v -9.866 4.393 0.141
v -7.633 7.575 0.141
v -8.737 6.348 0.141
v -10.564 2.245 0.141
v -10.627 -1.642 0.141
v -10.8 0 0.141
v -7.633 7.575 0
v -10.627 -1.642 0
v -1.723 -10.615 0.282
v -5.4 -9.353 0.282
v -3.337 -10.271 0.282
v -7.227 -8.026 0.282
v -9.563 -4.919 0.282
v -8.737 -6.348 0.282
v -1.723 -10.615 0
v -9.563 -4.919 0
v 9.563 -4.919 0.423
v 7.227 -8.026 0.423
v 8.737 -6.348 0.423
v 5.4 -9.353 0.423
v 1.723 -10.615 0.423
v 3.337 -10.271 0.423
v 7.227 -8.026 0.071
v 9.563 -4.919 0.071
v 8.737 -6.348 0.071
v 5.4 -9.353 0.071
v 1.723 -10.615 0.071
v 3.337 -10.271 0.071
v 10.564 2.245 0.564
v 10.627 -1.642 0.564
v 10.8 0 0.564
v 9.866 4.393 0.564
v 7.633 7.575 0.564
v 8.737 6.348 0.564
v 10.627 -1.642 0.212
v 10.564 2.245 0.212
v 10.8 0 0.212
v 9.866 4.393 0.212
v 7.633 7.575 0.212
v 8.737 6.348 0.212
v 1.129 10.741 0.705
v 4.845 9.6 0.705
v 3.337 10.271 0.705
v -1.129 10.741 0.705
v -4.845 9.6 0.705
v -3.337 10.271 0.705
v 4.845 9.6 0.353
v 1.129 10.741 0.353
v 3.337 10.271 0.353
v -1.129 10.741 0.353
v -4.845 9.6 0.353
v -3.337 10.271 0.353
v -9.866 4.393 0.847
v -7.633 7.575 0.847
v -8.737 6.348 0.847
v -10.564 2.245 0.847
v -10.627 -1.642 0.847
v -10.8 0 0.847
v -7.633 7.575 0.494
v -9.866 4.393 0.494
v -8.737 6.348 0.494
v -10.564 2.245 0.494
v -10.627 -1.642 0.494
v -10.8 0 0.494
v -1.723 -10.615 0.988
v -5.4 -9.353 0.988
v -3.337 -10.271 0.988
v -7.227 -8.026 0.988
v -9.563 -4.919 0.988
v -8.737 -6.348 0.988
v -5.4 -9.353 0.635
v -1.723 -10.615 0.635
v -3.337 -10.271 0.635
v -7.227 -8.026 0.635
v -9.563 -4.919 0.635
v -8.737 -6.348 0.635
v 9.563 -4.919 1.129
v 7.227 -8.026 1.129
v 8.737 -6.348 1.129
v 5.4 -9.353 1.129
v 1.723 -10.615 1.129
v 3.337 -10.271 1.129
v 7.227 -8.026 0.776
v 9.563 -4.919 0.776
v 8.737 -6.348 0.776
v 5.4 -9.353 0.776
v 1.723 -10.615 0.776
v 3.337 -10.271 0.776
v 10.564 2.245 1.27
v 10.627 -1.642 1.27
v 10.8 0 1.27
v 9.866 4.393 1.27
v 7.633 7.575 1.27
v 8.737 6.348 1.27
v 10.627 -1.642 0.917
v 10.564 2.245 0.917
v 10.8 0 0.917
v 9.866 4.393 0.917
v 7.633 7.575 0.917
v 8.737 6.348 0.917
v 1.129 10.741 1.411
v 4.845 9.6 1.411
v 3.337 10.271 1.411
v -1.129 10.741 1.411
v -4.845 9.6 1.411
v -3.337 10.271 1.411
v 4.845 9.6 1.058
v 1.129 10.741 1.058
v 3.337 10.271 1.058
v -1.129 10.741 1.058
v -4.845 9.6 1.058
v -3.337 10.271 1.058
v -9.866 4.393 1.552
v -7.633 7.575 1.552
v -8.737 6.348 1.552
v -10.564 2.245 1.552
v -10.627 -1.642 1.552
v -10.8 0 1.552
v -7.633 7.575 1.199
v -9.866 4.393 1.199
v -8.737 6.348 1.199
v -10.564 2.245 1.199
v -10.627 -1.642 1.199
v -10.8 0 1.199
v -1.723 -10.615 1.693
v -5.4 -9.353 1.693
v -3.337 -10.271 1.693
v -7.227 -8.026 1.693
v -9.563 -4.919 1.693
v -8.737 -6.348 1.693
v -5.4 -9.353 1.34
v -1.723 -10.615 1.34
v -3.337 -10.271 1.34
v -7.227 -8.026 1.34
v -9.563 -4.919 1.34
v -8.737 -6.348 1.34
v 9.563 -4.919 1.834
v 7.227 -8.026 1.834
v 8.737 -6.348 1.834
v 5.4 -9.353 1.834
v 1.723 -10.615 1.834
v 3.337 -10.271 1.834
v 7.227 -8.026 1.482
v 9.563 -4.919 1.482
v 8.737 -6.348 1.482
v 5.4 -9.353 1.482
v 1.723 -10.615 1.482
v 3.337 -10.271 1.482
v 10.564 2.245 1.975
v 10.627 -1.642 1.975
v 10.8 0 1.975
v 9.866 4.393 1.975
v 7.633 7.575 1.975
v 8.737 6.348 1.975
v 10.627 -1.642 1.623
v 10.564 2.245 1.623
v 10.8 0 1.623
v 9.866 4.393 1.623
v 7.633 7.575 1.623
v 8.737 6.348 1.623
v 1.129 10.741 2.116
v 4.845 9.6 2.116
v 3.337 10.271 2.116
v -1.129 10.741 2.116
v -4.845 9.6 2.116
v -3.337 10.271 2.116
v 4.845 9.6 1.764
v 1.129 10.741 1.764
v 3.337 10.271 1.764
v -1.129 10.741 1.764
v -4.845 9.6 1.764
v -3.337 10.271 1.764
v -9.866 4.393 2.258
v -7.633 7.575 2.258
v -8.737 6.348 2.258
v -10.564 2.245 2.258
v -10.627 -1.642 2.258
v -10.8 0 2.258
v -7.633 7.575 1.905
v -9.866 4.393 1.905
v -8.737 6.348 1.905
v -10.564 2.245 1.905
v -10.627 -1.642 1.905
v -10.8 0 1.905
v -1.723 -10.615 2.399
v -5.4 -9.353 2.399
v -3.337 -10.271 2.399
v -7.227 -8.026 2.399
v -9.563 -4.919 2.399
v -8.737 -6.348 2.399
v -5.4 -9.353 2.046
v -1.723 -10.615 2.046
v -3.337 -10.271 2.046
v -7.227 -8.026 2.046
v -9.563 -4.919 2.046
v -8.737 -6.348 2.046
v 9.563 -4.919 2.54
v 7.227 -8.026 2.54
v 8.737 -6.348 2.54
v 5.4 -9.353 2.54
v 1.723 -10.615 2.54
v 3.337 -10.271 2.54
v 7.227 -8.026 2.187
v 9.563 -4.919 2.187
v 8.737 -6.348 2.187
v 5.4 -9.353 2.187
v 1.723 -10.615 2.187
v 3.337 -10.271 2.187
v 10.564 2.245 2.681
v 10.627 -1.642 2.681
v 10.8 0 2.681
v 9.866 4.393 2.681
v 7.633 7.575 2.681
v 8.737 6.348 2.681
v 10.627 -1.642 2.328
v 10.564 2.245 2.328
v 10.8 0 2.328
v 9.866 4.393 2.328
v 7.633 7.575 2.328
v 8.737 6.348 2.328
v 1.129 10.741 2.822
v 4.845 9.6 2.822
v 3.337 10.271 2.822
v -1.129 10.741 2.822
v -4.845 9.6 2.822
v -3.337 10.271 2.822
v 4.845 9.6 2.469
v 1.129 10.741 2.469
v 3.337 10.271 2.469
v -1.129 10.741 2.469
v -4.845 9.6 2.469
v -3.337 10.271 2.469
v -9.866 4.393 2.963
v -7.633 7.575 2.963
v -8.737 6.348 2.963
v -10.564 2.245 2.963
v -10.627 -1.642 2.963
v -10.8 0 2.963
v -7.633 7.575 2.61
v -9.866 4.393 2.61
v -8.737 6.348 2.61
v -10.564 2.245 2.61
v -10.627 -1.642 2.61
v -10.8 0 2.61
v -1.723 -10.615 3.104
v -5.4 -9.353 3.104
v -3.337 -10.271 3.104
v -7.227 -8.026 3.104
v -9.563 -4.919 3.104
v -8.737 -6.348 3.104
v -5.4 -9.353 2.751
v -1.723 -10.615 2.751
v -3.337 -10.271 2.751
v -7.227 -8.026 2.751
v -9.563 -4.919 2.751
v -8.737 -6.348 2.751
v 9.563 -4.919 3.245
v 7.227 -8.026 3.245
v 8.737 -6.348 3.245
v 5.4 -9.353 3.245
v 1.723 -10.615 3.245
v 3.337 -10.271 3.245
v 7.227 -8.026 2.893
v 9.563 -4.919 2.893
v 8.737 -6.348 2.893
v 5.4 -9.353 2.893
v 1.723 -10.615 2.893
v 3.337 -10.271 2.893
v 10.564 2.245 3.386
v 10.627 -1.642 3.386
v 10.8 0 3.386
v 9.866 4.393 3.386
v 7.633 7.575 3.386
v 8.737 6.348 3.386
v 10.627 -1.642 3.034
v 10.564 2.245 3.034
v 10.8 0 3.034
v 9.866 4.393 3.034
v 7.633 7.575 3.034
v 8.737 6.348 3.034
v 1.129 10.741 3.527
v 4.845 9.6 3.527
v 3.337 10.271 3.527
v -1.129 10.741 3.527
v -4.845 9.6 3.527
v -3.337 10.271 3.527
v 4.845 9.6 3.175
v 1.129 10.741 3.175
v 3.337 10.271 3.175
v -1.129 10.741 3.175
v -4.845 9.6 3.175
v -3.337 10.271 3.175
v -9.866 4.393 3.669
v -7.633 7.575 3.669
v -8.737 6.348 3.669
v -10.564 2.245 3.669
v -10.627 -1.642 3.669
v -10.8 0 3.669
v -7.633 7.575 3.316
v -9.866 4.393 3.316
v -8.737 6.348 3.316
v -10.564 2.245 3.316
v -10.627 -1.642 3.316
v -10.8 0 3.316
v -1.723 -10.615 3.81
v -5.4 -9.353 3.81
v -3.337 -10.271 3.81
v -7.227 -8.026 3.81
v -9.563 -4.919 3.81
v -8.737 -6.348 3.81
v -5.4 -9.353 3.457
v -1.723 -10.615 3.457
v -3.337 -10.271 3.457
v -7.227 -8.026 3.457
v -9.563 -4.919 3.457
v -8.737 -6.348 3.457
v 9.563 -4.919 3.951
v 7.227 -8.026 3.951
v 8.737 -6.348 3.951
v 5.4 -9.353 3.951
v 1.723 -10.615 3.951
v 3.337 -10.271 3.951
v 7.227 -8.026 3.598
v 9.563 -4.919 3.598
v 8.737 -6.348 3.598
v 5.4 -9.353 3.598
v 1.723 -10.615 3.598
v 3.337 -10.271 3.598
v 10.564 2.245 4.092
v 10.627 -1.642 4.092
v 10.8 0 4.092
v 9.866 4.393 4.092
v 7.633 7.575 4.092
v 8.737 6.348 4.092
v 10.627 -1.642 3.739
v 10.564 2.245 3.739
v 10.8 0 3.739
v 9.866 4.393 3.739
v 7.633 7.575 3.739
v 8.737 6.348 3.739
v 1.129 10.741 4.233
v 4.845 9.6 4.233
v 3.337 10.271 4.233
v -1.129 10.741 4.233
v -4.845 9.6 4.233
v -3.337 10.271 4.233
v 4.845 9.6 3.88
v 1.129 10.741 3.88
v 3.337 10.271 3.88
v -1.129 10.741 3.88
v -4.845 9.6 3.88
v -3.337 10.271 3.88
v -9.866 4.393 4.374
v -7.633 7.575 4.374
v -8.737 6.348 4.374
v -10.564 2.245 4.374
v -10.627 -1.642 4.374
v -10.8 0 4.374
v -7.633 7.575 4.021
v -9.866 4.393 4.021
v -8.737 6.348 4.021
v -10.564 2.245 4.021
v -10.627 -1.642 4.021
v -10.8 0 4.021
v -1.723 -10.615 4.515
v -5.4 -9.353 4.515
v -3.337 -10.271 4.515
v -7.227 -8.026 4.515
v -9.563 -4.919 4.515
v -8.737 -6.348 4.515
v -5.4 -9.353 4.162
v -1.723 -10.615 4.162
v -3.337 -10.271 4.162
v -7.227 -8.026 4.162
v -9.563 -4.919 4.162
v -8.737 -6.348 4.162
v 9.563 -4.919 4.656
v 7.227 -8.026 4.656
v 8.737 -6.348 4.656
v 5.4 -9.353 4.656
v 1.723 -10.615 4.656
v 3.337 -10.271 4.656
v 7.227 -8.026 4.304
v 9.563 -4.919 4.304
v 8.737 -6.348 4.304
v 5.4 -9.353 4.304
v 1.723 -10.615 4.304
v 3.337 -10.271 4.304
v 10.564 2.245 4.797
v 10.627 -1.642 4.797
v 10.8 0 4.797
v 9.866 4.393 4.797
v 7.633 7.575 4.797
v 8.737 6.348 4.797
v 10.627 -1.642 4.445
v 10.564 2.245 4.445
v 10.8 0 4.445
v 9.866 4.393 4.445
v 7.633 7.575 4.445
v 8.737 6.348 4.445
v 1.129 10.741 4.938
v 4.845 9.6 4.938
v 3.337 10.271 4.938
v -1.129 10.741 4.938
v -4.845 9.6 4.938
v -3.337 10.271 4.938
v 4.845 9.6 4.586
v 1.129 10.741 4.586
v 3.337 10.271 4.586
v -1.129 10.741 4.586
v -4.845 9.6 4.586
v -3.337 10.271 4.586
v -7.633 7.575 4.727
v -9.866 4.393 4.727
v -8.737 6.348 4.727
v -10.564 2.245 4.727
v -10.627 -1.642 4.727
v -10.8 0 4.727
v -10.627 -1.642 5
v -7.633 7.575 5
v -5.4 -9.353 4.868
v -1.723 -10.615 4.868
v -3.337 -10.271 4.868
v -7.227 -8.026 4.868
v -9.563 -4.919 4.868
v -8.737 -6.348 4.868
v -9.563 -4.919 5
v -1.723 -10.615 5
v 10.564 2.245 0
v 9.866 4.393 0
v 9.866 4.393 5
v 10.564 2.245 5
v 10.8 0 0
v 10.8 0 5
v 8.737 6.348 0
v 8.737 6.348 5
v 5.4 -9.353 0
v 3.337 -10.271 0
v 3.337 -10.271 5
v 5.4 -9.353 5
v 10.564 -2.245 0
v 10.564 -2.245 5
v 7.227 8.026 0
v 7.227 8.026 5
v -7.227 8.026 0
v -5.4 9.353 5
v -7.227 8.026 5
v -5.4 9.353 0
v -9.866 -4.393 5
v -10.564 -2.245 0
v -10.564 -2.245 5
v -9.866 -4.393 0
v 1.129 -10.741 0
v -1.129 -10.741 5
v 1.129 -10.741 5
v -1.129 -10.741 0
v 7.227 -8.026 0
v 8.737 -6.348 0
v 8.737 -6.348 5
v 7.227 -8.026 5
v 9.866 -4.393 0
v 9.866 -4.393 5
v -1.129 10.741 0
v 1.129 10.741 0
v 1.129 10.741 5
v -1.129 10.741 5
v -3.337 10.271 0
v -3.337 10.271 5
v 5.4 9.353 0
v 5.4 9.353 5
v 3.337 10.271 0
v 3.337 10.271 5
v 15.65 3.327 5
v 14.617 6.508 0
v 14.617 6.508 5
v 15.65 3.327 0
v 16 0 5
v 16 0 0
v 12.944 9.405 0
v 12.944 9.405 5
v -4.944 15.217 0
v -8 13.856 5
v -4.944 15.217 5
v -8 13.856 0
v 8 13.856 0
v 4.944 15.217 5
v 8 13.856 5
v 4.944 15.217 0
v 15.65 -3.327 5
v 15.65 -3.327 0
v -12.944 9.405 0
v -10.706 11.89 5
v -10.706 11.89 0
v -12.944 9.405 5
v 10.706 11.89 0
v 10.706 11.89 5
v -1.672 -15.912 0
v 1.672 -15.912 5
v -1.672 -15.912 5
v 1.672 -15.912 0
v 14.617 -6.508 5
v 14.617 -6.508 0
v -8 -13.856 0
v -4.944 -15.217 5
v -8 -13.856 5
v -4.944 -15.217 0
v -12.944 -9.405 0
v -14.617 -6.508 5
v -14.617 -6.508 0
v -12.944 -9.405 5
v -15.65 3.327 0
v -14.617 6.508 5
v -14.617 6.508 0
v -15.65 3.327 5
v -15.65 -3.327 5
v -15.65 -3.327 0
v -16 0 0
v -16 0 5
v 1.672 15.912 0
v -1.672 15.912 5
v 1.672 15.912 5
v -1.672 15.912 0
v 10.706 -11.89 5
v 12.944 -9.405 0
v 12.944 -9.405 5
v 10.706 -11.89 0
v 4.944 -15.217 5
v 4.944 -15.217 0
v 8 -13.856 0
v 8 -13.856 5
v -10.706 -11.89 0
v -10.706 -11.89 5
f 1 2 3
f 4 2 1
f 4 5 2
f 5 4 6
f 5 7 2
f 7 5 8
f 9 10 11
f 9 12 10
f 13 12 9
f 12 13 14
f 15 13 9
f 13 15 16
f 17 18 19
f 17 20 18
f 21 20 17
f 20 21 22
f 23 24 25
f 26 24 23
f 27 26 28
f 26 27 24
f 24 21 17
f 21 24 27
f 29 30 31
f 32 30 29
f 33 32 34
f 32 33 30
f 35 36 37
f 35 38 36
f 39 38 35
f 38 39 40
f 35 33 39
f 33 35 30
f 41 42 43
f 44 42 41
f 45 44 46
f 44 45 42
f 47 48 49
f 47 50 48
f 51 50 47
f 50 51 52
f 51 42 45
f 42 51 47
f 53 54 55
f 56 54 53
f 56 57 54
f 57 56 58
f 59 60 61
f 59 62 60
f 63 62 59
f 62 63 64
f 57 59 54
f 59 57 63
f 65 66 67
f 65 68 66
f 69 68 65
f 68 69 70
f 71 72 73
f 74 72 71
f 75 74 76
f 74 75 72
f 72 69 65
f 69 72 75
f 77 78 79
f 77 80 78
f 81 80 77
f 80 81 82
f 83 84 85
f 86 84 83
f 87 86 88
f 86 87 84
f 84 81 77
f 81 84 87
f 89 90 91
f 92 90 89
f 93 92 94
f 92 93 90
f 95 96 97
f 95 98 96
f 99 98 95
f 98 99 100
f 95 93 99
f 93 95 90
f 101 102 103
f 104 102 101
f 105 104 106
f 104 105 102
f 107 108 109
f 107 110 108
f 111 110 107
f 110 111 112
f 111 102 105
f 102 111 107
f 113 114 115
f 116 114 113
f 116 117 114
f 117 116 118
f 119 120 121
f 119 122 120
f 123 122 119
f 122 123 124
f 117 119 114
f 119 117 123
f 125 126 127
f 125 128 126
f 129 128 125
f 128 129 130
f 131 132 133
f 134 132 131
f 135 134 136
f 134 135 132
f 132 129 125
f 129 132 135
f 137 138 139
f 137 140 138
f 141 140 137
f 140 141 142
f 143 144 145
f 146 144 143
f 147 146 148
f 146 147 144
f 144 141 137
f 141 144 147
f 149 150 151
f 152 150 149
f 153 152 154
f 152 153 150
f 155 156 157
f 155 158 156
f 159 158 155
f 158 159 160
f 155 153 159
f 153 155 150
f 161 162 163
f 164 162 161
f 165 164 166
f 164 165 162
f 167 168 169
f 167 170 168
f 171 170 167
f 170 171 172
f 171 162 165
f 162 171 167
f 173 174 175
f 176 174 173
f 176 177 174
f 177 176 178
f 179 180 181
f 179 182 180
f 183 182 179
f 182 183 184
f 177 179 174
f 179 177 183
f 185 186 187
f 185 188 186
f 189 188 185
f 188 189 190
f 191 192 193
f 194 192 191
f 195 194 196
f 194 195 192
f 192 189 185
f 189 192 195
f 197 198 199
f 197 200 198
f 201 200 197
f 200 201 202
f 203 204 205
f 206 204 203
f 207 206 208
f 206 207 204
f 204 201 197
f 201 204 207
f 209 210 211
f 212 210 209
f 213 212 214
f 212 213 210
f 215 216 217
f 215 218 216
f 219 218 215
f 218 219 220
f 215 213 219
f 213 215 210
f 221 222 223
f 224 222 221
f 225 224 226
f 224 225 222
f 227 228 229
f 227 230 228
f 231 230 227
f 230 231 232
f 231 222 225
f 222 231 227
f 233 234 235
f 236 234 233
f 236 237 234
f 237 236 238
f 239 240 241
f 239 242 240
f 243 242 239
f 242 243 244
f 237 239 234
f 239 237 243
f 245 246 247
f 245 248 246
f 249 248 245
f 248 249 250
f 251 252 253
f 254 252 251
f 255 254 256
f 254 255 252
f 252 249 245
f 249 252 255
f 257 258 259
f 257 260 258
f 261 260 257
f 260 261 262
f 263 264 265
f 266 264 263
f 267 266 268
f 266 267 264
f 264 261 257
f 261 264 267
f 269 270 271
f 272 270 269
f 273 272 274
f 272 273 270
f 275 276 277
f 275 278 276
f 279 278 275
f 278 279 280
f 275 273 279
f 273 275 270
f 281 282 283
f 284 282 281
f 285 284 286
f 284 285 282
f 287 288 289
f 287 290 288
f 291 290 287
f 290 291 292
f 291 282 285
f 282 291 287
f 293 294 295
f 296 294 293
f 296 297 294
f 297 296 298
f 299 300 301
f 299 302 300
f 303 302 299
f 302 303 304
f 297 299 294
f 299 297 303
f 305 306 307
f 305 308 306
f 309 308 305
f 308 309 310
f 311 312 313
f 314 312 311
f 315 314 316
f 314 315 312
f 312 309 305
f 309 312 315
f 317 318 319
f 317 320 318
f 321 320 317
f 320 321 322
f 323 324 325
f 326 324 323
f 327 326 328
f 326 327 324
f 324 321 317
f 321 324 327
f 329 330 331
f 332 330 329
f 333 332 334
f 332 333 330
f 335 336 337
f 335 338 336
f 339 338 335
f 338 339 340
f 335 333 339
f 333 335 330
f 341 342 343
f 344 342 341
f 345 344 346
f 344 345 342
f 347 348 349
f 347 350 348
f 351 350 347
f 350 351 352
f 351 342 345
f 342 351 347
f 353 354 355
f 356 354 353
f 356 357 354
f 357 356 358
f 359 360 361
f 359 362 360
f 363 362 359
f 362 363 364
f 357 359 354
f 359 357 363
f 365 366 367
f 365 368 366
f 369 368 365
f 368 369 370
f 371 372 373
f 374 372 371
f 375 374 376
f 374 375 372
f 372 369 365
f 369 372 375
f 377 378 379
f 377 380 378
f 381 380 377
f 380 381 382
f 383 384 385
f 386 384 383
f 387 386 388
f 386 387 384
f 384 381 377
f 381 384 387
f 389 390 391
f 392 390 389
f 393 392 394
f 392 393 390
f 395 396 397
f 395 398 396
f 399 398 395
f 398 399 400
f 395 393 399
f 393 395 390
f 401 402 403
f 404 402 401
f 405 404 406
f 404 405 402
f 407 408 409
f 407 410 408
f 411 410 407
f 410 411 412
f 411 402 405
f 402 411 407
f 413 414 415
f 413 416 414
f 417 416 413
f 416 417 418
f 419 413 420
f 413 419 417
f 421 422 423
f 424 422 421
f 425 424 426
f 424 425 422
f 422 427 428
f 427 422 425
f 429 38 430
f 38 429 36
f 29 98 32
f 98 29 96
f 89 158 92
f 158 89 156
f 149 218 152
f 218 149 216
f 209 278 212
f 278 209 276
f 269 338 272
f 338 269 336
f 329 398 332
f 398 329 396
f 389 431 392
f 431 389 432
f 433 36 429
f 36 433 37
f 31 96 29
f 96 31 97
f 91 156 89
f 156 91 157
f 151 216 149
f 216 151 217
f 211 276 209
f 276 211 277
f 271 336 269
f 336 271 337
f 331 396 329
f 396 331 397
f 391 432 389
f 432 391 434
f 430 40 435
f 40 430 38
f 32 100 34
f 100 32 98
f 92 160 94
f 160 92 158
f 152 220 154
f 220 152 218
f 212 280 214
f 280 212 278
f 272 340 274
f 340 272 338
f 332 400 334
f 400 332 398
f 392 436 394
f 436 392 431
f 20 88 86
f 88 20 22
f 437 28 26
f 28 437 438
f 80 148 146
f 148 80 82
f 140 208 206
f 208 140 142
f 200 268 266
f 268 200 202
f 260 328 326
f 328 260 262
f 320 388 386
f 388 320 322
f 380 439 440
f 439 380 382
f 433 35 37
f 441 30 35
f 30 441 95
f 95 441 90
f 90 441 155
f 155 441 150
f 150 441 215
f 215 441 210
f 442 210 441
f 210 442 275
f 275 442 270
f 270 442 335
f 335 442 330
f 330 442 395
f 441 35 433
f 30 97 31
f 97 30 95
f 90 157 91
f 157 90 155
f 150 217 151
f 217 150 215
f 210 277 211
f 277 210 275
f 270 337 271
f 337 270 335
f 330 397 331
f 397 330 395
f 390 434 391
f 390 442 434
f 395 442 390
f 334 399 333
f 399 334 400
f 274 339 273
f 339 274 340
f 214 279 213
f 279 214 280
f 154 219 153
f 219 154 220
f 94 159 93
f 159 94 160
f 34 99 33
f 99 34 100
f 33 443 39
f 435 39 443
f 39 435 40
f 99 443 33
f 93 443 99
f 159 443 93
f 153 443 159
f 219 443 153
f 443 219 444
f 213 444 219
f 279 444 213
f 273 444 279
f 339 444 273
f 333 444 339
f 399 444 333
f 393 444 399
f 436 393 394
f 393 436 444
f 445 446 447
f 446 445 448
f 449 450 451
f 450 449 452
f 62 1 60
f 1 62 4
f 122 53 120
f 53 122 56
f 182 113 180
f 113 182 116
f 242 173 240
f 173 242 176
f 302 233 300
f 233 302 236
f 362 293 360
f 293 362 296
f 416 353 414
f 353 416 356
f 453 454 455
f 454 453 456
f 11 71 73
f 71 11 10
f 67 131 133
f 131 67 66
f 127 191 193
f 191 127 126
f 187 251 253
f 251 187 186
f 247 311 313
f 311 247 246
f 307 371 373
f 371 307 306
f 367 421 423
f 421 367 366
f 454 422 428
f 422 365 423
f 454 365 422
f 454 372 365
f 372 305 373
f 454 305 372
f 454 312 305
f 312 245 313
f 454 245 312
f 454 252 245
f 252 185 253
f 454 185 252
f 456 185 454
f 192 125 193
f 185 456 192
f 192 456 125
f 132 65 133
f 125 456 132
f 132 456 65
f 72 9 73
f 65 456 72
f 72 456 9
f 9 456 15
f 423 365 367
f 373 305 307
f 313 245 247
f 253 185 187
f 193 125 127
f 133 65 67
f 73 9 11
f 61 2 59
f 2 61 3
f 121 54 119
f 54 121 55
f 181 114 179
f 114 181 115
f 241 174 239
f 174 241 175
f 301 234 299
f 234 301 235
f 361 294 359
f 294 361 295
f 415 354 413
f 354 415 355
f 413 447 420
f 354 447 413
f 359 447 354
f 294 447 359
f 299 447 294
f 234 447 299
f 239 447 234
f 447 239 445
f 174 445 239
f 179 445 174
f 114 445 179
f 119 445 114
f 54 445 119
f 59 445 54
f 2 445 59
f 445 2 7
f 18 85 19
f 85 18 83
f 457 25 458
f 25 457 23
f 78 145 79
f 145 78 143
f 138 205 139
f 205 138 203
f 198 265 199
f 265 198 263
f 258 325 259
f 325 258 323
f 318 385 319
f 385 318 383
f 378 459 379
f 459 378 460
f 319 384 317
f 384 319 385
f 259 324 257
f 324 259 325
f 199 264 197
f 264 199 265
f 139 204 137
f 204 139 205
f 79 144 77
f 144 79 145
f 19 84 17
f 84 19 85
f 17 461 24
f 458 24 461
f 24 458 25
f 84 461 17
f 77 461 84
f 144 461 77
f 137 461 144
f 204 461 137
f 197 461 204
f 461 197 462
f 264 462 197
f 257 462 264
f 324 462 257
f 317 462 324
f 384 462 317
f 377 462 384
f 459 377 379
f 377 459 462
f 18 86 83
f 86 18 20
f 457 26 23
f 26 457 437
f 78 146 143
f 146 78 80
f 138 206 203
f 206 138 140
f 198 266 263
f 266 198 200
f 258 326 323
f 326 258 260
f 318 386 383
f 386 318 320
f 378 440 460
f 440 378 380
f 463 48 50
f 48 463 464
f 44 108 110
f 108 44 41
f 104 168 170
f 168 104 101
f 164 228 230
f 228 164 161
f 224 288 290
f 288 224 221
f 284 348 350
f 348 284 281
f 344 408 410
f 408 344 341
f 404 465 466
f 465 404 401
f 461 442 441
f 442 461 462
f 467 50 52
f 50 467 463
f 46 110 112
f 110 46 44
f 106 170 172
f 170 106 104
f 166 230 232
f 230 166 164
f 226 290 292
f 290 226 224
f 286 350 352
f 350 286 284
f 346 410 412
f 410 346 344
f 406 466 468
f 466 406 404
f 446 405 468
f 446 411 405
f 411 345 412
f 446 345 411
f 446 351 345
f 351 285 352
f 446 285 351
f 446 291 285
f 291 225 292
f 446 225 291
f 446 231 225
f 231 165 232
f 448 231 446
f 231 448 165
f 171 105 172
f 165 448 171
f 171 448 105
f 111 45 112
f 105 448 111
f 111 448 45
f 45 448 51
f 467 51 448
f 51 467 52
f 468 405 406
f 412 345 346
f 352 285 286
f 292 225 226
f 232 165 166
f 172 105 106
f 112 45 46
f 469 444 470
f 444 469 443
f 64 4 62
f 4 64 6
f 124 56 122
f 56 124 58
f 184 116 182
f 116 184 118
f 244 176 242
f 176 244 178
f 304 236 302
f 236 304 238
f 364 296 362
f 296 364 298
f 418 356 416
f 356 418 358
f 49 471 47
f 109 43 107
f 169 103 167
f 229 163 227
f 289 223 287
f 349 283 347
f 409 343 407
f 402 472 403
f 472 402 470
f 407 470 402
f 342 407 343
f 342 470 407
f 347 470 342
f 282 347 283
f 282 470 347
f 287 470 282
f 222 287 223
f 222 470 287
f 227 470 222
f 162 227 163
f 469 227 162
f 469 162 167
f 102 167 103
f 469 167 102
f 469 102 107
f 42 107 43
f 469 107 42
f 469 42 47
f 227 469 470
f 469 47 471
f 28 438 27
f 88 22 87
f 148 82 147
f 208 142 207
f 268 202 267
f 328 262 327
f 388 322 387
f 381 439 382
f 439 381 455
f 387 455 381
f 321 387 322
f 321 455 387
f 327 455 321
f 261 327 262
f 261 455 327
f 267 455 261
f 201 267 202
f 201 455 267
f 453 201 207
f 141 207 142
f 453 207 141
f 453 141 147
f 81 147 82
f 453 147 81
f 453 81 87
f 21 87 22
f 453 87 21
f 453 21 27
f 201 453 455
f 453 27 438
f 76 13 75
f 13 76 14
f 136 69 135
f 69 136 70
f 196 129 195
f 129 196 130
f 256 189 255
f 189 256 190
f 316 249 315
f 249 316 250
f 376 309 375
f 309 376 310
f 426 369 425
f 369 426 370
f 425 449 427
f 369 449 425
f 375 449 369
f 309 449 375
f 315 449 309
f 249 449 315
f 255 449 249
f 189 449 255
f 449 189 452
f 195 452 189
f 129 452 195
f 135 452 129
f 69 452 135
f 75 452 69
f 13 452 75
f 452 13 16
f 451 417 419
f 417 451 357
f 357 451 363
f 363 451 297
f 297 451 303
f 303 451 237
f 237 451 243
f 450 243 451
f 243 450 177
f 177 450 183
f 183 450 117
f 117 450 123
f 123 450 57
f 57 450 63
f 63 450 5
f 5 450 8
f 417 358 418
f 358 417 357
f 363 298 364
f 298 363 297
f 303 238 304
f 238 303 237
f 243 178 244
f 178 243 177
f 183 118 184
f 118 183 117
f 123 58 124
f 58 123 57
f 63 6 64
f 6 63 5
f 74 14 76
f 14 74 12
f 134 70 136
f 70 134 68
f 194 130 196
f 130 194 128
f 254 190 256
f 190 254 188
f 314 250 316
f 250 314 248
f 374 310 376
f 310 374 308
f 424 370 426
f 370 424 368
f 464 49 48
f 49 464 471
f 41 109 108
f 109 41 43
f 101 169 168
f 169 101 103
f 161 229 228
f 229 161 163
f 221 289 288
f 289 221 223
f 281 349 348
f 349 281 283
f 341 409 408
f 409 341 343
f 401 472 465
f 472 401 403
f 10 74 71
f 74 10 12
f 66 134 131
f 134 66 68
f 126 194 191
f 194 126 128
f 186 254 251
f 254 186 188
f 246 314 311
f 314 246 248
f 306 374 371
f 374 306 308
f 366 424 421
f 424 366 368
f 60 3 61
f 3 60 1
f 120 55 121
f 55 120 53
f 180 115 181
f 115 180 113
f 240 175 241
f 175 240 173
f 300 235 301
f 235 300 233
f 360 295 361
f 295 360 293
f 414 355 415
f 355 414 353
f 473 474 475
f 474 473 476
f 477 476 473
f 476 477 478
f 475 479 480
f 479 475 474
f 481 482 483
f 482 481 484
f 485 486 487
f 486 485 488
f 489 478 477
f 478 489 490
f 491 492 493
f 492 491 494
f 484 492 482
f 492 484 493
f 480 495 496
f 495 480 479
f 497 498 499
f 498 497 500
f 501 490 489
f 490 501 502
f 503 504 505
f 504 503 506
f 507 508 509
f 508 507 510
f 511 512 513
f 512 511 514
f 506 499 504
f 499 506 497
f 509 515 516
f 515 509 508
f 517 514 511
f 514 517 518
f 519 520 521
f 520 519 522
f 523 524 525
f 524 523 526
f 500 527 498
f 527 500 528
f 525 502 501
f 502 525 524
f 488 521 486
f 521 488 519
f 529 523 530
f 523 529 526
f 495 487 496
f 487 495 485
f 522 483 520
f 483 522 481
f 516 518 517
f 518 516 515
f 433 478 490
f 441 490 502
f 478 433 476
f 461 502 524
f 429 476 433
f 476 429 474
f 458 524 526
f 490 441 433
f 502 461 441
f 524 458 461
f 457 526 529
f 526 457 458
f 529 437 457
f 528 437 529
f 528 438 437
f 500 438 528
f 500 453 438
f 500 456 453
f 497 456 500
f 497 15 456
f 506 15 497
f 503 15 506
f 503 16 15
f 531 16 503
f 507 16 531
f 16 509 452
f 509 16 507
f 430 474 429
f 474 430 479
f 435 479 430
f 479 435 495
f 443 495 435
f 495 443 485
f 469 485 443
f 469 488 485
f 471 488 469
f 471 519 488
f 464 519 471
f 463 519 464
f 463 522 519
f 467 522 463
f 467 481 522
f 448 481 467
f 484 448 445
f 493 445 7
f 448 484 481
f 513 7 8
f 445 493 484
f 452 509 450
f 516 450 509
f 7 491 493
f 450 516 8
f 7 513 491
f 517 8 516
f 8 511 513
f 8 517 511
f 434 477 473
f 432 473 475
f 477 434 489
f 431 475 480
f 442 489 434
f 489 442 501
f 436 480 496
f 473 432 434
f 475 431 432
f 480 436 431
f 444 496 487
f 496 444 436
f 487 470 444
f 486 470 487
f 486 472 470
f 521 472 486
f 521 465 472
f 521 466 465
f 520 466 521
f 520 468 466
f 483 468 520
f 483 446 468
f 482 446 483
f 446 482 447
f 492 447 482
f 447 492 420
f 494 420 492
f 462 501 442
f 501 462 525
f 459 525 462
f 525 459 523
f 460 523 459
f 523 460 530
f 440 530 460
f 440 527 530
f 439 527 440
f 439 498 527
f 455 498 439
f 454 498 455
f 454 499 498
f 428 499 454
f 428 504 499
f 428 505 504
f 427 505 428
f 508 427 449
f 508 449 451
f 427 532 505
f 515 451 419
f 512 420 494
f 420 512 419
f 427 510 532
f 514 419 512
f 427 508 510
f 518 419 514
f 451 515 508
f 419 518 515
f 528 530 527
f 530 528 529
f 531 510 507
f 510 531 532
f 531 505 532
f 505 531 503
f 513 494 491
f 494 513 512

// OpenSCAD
/******************************************************************
*                                                                 *
* OpenFlexure Microscope: OpenSCAD Utility functions              *
*                                                                 *
* This is part of the OpenFlexure microscope, an open-source      *
* microscope and 3-axis translation stage.  It gets really good   *
* precision over a ~10mm range, by using plastic flexure          *
* mechanisms.                                                     *
*                                                                 *
* (c) Richard Bowman, January 2016                                *
* Released under the CERN Open Hardware License                   *
*                                                                 *
******************************************************************/


//utilities

d=0.05;

function zeroz(size) = [size[0], size[1], 0]; //set the Z component of a 3-vector to 0

module reflect(axis){ //reflects its children about the origin, but keeps the originals
	children();
	mirror(axis) children();
}
module repeat(delta,N,center=false){ //repeat something along a regular array
	translate( (center ?  -(N-1)/2 : 0) * delta)
				for(i=[0:1:(N-1)]) translate(i*delta) children();
}

module nut(d,h=-1,center=false,fudge=1.18,shaft=false){ //make a nut, for metric bolt of nominal diameter d
	//d: nominal bolt diameter (e.g. 3 for M3)
	//h: height of nut
	//center: works as for cylinder
	//fudge: multiply the diameter by this number (1.22 works when vertical)
	//shaft: include a long cylinder representing the bolt shaft, diameter=d*1.05
	h=(h<0)?d*0.8:h;
    union(){
		cylinder(h=h,center=center,r=0.9*d*fudge,$fn=6); 
		if(shaft){
			reflect([0,0,1]) cylinder(r=d/2*1.05*(fudge+1)/2,h=99999999999,$fn=16); 
			//the reason I reflect rather than use center=true is that the latter 
			//fails in fast preview mode (I guess because of the lack of points 
			//inside the nut).  Also, less fudge is applied to the shaft, it can
			//always be fixed with a drill after all...
		}
	}
}
module nut_from_bottom(d,h=-1,fudge=1.2,shaft=true,chamfer_r=0.75,chamfer_h=0.75){ //make a nut, for metric bolt of nominal diameter d
	//d: nominal bolt diameter (e.g. 3 for M3)
	//h: height of nut
	//center: works as for cylinder
	//fudge: multiply the diameter by this number (1.22 works when vertical)
	//shaft: include a long cylinder representing the bolt shaft, diameter=d*1.05
	h=(h<0)?d*0.8:h;
    union(){
		cylinder(h=h,r=0.9*d*fudge,$fn=6); 
		translate([0,0,-0.05]) cylinder(h=chamfer_h,r1=0.9*d*fudge+chamfer_r,r2=0.9*d*fudge,$fn=6); 
		mirror([0,0,1]) cylinder(h=9999,r=0.9*d*fudge+chamfer_r,$fn=6); 
		if(shaft){
             sr=d/2*1.05*(fudge+1)/2; //radius of shaft
			translate([0,0,h/2]) reflect([0,0,1]) cylinder(r=sr,h=99999999999,$fn=16); 
			//the reason I reflect rather than use center=true is that the latter 
			//fails in fast preview mode (I guess because of the lack of points 
			//inside the nut).  Also, less fudge is applied to the shaft, it can
			//always be fixed with a drill after all...
			intersection(){ //we add a little cut to the roof of the surface so the initial bridges don't have to span the hole.
				union(){
					translate([0,0,h]) cube([9999,sr*2,0.5],center=true);
					translate([0,0,h+0.25]) cube([sr*2,sr*2,0.5],center=true);
				}
				cylinder(h=h+1,r=0.9*d*fudge,$fn=6); 
			}
		}
	}
}
//nut_from_bottom(4,chamfer_h=4,h=7);

module nut_y(d,h=-1,center=false,fudge=1.15,extra_height=0.7,shaft=false,shaft_length=0,top_access=false){ //make a nut, for metric bolt of nominal diameter d
	//d: nominal bolt diameter (e.g. 3 for M3)
	//h: height of nut
	//center: works as for cylinder
	//fudge: multiply the diameter by this number (1.22 works when vertical)
	//shaft: include a long cylinder representing the bolt shaft, diameter=d*1.05
    //top_access: extend the nut upwards to allow it to drop in.
	h=(h<0)?d*0.8:h;
    r=0.9*d*fudge;
    union(){
		rotate([-90,top_access?30:0,0]) cylinder(h=h,center=center,r=r,$fn=6);
		translate([-r*sin(30),center?-h/2:0,0]) cube([2*r*sin(30),h,r*cos(30)+extra_height]);
		if(shaft || shaft_length > 0){
            sl = shaft_length >0 ? shaft_length : 9999;
			translate([0,h/2,0]) reflect([0,1,0]) cylinder_with_45deg_top(h=sl,r=d/2*1.05*fudge,$fn=16,extra_height=extra_height); 
			//the reason I reflect rather than use center=true is that the latter 
			//fails in fast preview mode (I guess because of the lack of points 
			//inside the nut).
		}
        if(top_access){ //hole from the top
            translate([-r*cos(30),center?-h/2:0,0]) cube([2*r*cos(30),h,9999]);
        }
	}
}
module screw_y(d,h=-1,center=false,fudge=1.05,extra_height=0.7,shaft=false,shaft_length=999999){ //make a nut, for metric bolt of nominal diameter d
	//d: nominal bolt diameter (e.g. 3 for M3)
	//h: height of nut
	//center: works as for cylinder
	//fudge: multiply the diameter by this number (1.22 works when vertical)
	//shaft: include a long cylinder representing the bolt shaft, diameter=d*1.05
	h=(h<0)?d*0.8:h; //height of screw head
    r=0.9*d*fudge; //radius of screw head
    union(){
		cylinder_with_45deg_top(h=h,r=d*1.05*fudge,$fn=16,extra_height=extra_height); 
		if(shaft){
			translate([0,center ? 0 : h/2,0]) reflect([0,1,0]) cylinder_with_45deg_top(h=shaft_length+h/2,r=d/2*1.05*fudge,$fn=16,extra_height=extra_height); 
			//the reason I reflect rather than use center=true is that the latter 
			//fails in fast preview mode (I guess because of the lack of points 
			//inside the nut).
		}
	}
}
//screw_y(4,shaft=true, shaft_length=10);
module pinch_y(d, screw_l=999, counterbore_l=999, nut_l=-1, gap=[], t=2,extra_height=0.7,top_access=false){
    //gap with a nut/bolt to squeeze it
    nut_l = nut_l<0 ? d : nut_l; //default nut height
    gap = len(gap)==3 ? gap : [4*d, d, 4*d];
    union(){
        translate([0,gap[1]/2+t]) screw_y(d,h=counterbore_l,shaft=true,shaft_length=2*screw_l,extra_height=extra_height);
        cube(gap,center=true);
        translate([0,-gap[1]/2-t]) mirror([0,1,0]) nut_y(d, h=nut_l,center=false,shaft=false,top_access=top_access);
    }
}
//pinch_y(4,screw_l=10,t=4,top_access=true);

module chamfered_hole(r=10, h=10, chamfer=1,center=false){
    translate([0,0, center ? -h/2 : 0]) union(){
        translate([0,0,-d]) cylinder(r1=r+chamfer+d,r2=r,h=chamfer+d);
        cylinder(r=r,h=h);
        translate([0,0,h-chamfer]) cylinder(r1=r,r2=r+chamfer+d,h=chamfer+d);
    }
}
//chamfered_hole(15,30,center=true);

module unrotate(rotation){
	//undo a previous rotation, NB this is NOT the same as rotate(-rotation) due to ordering.
	rotate([0,0,-rotation[2]]) rotate([0,-rotation[1],0]) rotate([-rotation[0],0,0]) children();
}

module smatrix(xx=1,yy=1,zz=1,xy=0,xz=0,yx=0,yz=0,zx=0,zy=0, xt=0, yt=0, zt=0){
    //apply a matrix transformation, specifying the matrix sparsely
    //this is useful because most helpful matrices are close to the identity.
    multmatrix([[xx, xy, xz, xt],
                [yx, yy, yz, yt],
                [zx, zy, zz, zt],
                [0,  0,  0,  1]]) children();
}

module support(size, height, baseheight=0, rotation=[0,0,0], supportangle=45, outline=false){
	//generate "support material" in the STL file for selective supporting of things
	module support_2d(){
        sw=1.0;
        sp=3;
		union(){
			if(outline){
				difference()	{
					minkowski(){
						children();
						circle(r=sw,$fn=8);
					}
					children();
				}
			}
			intersection(){
				children();
				rotate(supportangle) for(x=[-size:sp:size])
					translate([x,0]) square([sw,2*size],center=true);
			}
		}
	}
	
	unrotate(rotation){
		translate([0,0,baseheight]) linear_extrude(height) support_2d() projection() rotate(rotation) children();
	}
	children();
}

module rightangle_prism(size,center=false){
	intersection(){
		cube(size,center=center);
		rotate([0,45,0]) translate([9999/2,0,0]) cube([1,1,1]*9999,center=true);
	}
}

module sequential_hull(){
	//given a sequence of >2 children, take the convex hull between each pair - a helpful, general extrusion technique.
	for(i=[0:$children-2]){
		hull(){
			children(i);
			children(i+1);
		}
	}
}

module union_preserving_holes(){
	//given a number of children, return the union of them, but preserve holes in each part
	difference(){
		union(){  //the union of all the parts
			children();
		}
		union(){ //the union of all the holes
			for(i=[0:$children-1]){
				difference(){
					hull() children(i);
					children(i);
				}
			}
		}
	}
}

module cylinder_with_45deg_top(h,r,center=false,extra_height=0.7,$fn=$fn){
	union(){
		rotate([90,0,180]) hull(){
			cylinder(h=h,r=r,$fn=$fn,center=center);
			translate([0,r-0.001,center?0:h/2]) cube([2*sin(45/2)*r,0.002,h],center=true);
		}
		rotate([90,0,180]) translate([0,r-0.001,(center?0:h/2)]) cube([2*sin(45/2)*r,0.002+2*extra_height,h],center=true);
	}
}

module feather_vertical_edges(flat_h=0.2,fin_r=0.5,fin_h=0.72,object_h=20){
	union(){
	//	children();
		minkowski(){
			intersection(){
				children();
				union() for(i=[-floor(object_h/fin_h):floor(object_h/fin_h)]) translate([0,0,i*fin_h+flat_h*1.5]) cube([9999,9999,flat_h],center=true);
			}
			cylinder(r1=0,r2=fin_r,h=fin_h-2*flat_h,$fn=8);
		}
	}
}

module square_to_circle(r, h, layers=4, top_cylinder=0){
    // A stack of thin shapes, starting as a square and
    // gradually gaining sides to turn into a cylinder
    sides=[4,8,16,32,64,128,256]; //number of sides
    for(i=[0:(layers-1)]) rotate(180/sides[i]) 
        translate([0,0,i*h/layers]) cylinder(r=r/cos(180/sides[i]),h=h/layers+d,$fn=sides[i]);
    if(top_cylinder>0) cylinder(r=r,h=h+top_cylinder, $fn=sides[layers-1]);
}

module hole_from_bottom(r, h, base_w=-1, dz=0.5, big_bottom=true){
    // This creates a cut-out that can be used to make a hole in a large
    // bridge, without too much spaghetti!
    base = base_w>0 ? [base_w,2*r,2*dz] : [2*r,2*r,d];
    union(){
        translate([0,0,0]) cube(base,center=true);
        translate([0,0,base[2]/2-d]) square_to_circle(r, dz*4, 4, h-dz*5+d);
        if(big_bottom) mirror([0,0,1]) cylinder(r=999,h=999,$fn=8);
    }
}

//hole_from_bottom(3, 10, base_w=12);


module lighttrap_cylinder(r1,r2,h,ridge=1.5){
    //A "cylinder" made up of christmas-tree-like cones
    //good for trapping light in an optical path
    //r1 is the outer radius of the bottom
    //r2 is the inner radius of the top
    //NB for a straight-sided cylinder, r2==r1-ridge
    n_cones = floor(h/ridge);
    cone_h = h/n_cones;
    
	for(i = [0 : n_cones - 1]){
        p = i/(n_cones - 1);
		translate([0, 0, i * cone_h - d]) 
			cylinder(r1=(1-p)*r1 + p*(r2+ridge),
					r2=(1-p)*(r1-ridge) + p*r2,
					h=cone_h+2*d);
    }
}
module lighttrap_sqylinder(r1,f1,r2,f2,h,ridge=1.5){
    //A "cylinder" made up of christmas-tree-like cones
    //good for trapping light in an optical path
    //r1 is the outer radius of the bottom
    //f1 is the outer flat length of the bottom (f1=0 makes the bottom circular)
    //r2 is the inner radius of the top
    //f2 is the inner flat length of the top (f2=0 makes it circular)
    //NB for a straight-sided cylinder, r2==r1-ridge
    //Also, the ridges are made by varying r, not f.  This means there's a minimum r1
    //which is the value of ridge.
    n_cones = floor(h/ridge);
    cone_h = h/n_cones;
    
	for(i = [0 : n_cones - 1]){
        p = i/(n_cones - 1);
		translate([0, 0, i * cone_h - d]) 
			minkowski(){
                cylinder(r1=(1-p)*r1 + p*(r2+ridge),
					r2=(1-p)*(r1-ridge) + p*r2,
					h=cone_h);
                cube([1,1,0]*((1-p)*f1 + p*f2) + [0,0,2*d], center=true);
            }
    }
}


module add_hull_base(h=1){
    // Take the convex hull of some objects, and add it in as a
    // thin layer at the bottom
    union(){
        intersection(){
            hull() children();
            cylinder(r=9999,$fn=8,h=h); //make the base thin
        }
        children();
    }
}
module add_roof(inner_h){
    // Take the convex hull of some objects, and add the top
    // of it as a roof.  NB you must specify the height of
    // the underside of the roof - finding it automatically
    // would be too much work...
    union(){
        difference(){
            hull() children();
            cylinder(r=9999,$fn=8,h=inner_h);
        }
        children();
    }
}

module trylinder(r=1, flat=1, h=d, center=false){
    //Halfway between a cylinder and a triangle.
    //NB the largest cylinder that fits inside it has r=r+f/(2*sqrt(3))
    //A passable "self tapping hole" sets 
    hull() for(a=[0,120,240]) rotate(a)
        translate([0,flat/sqrt(3),0]) cylinder(r=r, h=h, center=center);
}
module trylinder_selftap(nominal_d=3, h=10, center=false){
    // Make a trylinder that you can self-tap a machine screw into.
    // The size is deliberately a bit big for small holes, so that
    // it compensates for splodgy printing
    r = max(nominal_d*0.8/2 + 0.2, nominal_d/2 - 0.2);
    dr = 0.5;
    flat = dr * 2 * sqrt(3);
    trylinder(r=r - dr, flat=flat, h=h, center=center);
}
module trylinder_gripper(inner_r=10,h=6,grip_h=3.5,base_r=-1,t=0.65,squeeze=1,flare=0.8,solid=false){
    // This creates a tapering, distorted hollow cylinder suitable for
    // gripping a small cylindrical (or spherical) object
    // The gripping occurs grip_h above the base, and it flares out
    // again both above and below this.
    // inner_r: radius of the cylinder we're gripping
    // h: overall height of the gripper
    // grip_h: height of the part where the gripper touches the cylinder
    // base_r: radius of the (cylindrical) bottom
    // t: thickness of the walls
    // squeeze: how far the wall must be distorted to fit the cylinder
    // flare: how much larger the top is than the gripping part
    // solid: if true, make a solid outline of the gripper
    $fn=48;
    bottom_r=base_r>0?base_r:inner_r+1+t;
    difference(){
        sequential_hull(){
            translate([0,0,0]) cylinder(r=bottom_r,h=d);
            translate([0,0,grip_h-0.5]) trylinder(r=inner_r-squeeze+t,flat=2.5*squeeze,h=d);
            translate([0,0,grip_h+0.5]) trylinder(r=inner_r-squeeze+t,flat=2.5*squeeze,h=d);
            translate([0,0,h-d]) trylinder(r=inner_r-squeeze+flare+t,flat=2.5*squeeze,h=d);
        }
        if(solid==false) sequential_hull(){
            translate([0,0,-d]) cylinder(r=bottom_r-t,h=d);
            translate([0,0,grip_h-0.5]) trylinder(r=inner_r-squeeze,flat=2.5*squeeze,h=d);
            translate([0,0,grip_h+0.5]) trylinder(r=inner_r-squeeze,flat=2.5*squeeze,h=d);
            translate([0,0,h]) trylinder(r=inner_r-squeeze+flare,flat=2.5*squeeze,h=d);
        }
    }
}

module deformable_hole_trylinder(r1, r2, h=99, corner_roc=-1, dz=0.5, center=false){
    // A cylinder with feathered edges, to make a hole that is
    // slightly deformable, in an otherwise rigid structure.
    // r1: inner radius
    // r2: outer radius
    // h, center: as for cylinder
    // corner_roc: radius of curvature of the trylinder
    // dz: thickness of layers
    n = floor(h/(2*dz)); //number of layers in the structure
    flat_l = 2*sqrt(r2*r2 - r1*r1);
    corner_roc = corner_roc < 0 ? r1 - flat_l/(2*sqrt(3)) : corner_roc;
    repeat([0,0,2*dz], n, center=center) union(){
        cylinder(r=r2, h=dz+d);
        translate([0,0,center ? -dz : dz]) trylinder(r=corner_roc, flat=flat_l, h=dz+d);
    }
}
module self_tap_hole(mean_r, h, dr=1, dz=0.5, bridge_facets=0, center=false, screw=true){
    // A cylinder with bridges around the edges, aiming to make
    // a hole with nicely feathered edges.
    // mean_r is the radius of the thing you're inserting.  The
    // "hard" edge of the hole will be mean_r + dr/2 and the "soft"
    // inner edge will be at mean_r - dr/2;
    // bridge_facets determines the number of bridges used - can be
    // safely left at the default value.
    // center has the same meaning as in cylinder.
    inner_r = mean_r - dr/2;
    outer_r = mean_r + dr/2;
    bridge_facets = bridge_facets > 0 ? bridge_facets : floor(180/acos(inner_r/outer_r)); //sensible default for number of bridges
    difference(){
        cylinder(r=outer_r, h=h, center=center);
        
        repeat([0,0,2*dz], ceil(h/dz/2), center=center) for(i=[1:bridge_facets]){
            rotate(i*360/bridge_facets) translate([-999,inner_r,screw ? i/bridge_facets*2*dz : 0]) cube([999*2,999,dz]);
        }
    }
}

            
        
difference(){
    cylinder(r=16, h=5);
    self_tap_hole(20.4/2, dr=1.2, dz=0.7055/2, h=11, center=true, bridge_facets=5);
}

module exterior_brim(r=4, h=0.2){
    // Add a "brim" around the outside of an object *only*, preserving holes in the object
    children();
    
    linear_extrude(h) difference(){
        offset(r) projection(cut=true) translate([0,0,-d]) children();
       
        offset(-r) offset(r) projection(cut=true) translate([0,0,-d]) children();
    }
}

//trylinder_gripper();
//feather_vertical_edges(fin_r=1){
//	cylinder(r=12,h=10);
//}

//cylinder_with_45deg_top(20,10,center=false,$fn=32,extra_height=0.5);

//$fn=12;
//sequential_hull(){
//	translate([0,0,0]) sphere(r=.2);
//	translate([0,1,0]) sphere(r=.2);
//	translate([0,1,1]) sphere(r=.2);
//	translate([1,1,1]) sphere(r=.2);
//}

//nut(3,shaft=true);

//rightangle_prism([1,1,1],center=true);

//support(50,20,baseheight=-20,rotation=[90,0,0]) sphere(r=8,$fn=16);
